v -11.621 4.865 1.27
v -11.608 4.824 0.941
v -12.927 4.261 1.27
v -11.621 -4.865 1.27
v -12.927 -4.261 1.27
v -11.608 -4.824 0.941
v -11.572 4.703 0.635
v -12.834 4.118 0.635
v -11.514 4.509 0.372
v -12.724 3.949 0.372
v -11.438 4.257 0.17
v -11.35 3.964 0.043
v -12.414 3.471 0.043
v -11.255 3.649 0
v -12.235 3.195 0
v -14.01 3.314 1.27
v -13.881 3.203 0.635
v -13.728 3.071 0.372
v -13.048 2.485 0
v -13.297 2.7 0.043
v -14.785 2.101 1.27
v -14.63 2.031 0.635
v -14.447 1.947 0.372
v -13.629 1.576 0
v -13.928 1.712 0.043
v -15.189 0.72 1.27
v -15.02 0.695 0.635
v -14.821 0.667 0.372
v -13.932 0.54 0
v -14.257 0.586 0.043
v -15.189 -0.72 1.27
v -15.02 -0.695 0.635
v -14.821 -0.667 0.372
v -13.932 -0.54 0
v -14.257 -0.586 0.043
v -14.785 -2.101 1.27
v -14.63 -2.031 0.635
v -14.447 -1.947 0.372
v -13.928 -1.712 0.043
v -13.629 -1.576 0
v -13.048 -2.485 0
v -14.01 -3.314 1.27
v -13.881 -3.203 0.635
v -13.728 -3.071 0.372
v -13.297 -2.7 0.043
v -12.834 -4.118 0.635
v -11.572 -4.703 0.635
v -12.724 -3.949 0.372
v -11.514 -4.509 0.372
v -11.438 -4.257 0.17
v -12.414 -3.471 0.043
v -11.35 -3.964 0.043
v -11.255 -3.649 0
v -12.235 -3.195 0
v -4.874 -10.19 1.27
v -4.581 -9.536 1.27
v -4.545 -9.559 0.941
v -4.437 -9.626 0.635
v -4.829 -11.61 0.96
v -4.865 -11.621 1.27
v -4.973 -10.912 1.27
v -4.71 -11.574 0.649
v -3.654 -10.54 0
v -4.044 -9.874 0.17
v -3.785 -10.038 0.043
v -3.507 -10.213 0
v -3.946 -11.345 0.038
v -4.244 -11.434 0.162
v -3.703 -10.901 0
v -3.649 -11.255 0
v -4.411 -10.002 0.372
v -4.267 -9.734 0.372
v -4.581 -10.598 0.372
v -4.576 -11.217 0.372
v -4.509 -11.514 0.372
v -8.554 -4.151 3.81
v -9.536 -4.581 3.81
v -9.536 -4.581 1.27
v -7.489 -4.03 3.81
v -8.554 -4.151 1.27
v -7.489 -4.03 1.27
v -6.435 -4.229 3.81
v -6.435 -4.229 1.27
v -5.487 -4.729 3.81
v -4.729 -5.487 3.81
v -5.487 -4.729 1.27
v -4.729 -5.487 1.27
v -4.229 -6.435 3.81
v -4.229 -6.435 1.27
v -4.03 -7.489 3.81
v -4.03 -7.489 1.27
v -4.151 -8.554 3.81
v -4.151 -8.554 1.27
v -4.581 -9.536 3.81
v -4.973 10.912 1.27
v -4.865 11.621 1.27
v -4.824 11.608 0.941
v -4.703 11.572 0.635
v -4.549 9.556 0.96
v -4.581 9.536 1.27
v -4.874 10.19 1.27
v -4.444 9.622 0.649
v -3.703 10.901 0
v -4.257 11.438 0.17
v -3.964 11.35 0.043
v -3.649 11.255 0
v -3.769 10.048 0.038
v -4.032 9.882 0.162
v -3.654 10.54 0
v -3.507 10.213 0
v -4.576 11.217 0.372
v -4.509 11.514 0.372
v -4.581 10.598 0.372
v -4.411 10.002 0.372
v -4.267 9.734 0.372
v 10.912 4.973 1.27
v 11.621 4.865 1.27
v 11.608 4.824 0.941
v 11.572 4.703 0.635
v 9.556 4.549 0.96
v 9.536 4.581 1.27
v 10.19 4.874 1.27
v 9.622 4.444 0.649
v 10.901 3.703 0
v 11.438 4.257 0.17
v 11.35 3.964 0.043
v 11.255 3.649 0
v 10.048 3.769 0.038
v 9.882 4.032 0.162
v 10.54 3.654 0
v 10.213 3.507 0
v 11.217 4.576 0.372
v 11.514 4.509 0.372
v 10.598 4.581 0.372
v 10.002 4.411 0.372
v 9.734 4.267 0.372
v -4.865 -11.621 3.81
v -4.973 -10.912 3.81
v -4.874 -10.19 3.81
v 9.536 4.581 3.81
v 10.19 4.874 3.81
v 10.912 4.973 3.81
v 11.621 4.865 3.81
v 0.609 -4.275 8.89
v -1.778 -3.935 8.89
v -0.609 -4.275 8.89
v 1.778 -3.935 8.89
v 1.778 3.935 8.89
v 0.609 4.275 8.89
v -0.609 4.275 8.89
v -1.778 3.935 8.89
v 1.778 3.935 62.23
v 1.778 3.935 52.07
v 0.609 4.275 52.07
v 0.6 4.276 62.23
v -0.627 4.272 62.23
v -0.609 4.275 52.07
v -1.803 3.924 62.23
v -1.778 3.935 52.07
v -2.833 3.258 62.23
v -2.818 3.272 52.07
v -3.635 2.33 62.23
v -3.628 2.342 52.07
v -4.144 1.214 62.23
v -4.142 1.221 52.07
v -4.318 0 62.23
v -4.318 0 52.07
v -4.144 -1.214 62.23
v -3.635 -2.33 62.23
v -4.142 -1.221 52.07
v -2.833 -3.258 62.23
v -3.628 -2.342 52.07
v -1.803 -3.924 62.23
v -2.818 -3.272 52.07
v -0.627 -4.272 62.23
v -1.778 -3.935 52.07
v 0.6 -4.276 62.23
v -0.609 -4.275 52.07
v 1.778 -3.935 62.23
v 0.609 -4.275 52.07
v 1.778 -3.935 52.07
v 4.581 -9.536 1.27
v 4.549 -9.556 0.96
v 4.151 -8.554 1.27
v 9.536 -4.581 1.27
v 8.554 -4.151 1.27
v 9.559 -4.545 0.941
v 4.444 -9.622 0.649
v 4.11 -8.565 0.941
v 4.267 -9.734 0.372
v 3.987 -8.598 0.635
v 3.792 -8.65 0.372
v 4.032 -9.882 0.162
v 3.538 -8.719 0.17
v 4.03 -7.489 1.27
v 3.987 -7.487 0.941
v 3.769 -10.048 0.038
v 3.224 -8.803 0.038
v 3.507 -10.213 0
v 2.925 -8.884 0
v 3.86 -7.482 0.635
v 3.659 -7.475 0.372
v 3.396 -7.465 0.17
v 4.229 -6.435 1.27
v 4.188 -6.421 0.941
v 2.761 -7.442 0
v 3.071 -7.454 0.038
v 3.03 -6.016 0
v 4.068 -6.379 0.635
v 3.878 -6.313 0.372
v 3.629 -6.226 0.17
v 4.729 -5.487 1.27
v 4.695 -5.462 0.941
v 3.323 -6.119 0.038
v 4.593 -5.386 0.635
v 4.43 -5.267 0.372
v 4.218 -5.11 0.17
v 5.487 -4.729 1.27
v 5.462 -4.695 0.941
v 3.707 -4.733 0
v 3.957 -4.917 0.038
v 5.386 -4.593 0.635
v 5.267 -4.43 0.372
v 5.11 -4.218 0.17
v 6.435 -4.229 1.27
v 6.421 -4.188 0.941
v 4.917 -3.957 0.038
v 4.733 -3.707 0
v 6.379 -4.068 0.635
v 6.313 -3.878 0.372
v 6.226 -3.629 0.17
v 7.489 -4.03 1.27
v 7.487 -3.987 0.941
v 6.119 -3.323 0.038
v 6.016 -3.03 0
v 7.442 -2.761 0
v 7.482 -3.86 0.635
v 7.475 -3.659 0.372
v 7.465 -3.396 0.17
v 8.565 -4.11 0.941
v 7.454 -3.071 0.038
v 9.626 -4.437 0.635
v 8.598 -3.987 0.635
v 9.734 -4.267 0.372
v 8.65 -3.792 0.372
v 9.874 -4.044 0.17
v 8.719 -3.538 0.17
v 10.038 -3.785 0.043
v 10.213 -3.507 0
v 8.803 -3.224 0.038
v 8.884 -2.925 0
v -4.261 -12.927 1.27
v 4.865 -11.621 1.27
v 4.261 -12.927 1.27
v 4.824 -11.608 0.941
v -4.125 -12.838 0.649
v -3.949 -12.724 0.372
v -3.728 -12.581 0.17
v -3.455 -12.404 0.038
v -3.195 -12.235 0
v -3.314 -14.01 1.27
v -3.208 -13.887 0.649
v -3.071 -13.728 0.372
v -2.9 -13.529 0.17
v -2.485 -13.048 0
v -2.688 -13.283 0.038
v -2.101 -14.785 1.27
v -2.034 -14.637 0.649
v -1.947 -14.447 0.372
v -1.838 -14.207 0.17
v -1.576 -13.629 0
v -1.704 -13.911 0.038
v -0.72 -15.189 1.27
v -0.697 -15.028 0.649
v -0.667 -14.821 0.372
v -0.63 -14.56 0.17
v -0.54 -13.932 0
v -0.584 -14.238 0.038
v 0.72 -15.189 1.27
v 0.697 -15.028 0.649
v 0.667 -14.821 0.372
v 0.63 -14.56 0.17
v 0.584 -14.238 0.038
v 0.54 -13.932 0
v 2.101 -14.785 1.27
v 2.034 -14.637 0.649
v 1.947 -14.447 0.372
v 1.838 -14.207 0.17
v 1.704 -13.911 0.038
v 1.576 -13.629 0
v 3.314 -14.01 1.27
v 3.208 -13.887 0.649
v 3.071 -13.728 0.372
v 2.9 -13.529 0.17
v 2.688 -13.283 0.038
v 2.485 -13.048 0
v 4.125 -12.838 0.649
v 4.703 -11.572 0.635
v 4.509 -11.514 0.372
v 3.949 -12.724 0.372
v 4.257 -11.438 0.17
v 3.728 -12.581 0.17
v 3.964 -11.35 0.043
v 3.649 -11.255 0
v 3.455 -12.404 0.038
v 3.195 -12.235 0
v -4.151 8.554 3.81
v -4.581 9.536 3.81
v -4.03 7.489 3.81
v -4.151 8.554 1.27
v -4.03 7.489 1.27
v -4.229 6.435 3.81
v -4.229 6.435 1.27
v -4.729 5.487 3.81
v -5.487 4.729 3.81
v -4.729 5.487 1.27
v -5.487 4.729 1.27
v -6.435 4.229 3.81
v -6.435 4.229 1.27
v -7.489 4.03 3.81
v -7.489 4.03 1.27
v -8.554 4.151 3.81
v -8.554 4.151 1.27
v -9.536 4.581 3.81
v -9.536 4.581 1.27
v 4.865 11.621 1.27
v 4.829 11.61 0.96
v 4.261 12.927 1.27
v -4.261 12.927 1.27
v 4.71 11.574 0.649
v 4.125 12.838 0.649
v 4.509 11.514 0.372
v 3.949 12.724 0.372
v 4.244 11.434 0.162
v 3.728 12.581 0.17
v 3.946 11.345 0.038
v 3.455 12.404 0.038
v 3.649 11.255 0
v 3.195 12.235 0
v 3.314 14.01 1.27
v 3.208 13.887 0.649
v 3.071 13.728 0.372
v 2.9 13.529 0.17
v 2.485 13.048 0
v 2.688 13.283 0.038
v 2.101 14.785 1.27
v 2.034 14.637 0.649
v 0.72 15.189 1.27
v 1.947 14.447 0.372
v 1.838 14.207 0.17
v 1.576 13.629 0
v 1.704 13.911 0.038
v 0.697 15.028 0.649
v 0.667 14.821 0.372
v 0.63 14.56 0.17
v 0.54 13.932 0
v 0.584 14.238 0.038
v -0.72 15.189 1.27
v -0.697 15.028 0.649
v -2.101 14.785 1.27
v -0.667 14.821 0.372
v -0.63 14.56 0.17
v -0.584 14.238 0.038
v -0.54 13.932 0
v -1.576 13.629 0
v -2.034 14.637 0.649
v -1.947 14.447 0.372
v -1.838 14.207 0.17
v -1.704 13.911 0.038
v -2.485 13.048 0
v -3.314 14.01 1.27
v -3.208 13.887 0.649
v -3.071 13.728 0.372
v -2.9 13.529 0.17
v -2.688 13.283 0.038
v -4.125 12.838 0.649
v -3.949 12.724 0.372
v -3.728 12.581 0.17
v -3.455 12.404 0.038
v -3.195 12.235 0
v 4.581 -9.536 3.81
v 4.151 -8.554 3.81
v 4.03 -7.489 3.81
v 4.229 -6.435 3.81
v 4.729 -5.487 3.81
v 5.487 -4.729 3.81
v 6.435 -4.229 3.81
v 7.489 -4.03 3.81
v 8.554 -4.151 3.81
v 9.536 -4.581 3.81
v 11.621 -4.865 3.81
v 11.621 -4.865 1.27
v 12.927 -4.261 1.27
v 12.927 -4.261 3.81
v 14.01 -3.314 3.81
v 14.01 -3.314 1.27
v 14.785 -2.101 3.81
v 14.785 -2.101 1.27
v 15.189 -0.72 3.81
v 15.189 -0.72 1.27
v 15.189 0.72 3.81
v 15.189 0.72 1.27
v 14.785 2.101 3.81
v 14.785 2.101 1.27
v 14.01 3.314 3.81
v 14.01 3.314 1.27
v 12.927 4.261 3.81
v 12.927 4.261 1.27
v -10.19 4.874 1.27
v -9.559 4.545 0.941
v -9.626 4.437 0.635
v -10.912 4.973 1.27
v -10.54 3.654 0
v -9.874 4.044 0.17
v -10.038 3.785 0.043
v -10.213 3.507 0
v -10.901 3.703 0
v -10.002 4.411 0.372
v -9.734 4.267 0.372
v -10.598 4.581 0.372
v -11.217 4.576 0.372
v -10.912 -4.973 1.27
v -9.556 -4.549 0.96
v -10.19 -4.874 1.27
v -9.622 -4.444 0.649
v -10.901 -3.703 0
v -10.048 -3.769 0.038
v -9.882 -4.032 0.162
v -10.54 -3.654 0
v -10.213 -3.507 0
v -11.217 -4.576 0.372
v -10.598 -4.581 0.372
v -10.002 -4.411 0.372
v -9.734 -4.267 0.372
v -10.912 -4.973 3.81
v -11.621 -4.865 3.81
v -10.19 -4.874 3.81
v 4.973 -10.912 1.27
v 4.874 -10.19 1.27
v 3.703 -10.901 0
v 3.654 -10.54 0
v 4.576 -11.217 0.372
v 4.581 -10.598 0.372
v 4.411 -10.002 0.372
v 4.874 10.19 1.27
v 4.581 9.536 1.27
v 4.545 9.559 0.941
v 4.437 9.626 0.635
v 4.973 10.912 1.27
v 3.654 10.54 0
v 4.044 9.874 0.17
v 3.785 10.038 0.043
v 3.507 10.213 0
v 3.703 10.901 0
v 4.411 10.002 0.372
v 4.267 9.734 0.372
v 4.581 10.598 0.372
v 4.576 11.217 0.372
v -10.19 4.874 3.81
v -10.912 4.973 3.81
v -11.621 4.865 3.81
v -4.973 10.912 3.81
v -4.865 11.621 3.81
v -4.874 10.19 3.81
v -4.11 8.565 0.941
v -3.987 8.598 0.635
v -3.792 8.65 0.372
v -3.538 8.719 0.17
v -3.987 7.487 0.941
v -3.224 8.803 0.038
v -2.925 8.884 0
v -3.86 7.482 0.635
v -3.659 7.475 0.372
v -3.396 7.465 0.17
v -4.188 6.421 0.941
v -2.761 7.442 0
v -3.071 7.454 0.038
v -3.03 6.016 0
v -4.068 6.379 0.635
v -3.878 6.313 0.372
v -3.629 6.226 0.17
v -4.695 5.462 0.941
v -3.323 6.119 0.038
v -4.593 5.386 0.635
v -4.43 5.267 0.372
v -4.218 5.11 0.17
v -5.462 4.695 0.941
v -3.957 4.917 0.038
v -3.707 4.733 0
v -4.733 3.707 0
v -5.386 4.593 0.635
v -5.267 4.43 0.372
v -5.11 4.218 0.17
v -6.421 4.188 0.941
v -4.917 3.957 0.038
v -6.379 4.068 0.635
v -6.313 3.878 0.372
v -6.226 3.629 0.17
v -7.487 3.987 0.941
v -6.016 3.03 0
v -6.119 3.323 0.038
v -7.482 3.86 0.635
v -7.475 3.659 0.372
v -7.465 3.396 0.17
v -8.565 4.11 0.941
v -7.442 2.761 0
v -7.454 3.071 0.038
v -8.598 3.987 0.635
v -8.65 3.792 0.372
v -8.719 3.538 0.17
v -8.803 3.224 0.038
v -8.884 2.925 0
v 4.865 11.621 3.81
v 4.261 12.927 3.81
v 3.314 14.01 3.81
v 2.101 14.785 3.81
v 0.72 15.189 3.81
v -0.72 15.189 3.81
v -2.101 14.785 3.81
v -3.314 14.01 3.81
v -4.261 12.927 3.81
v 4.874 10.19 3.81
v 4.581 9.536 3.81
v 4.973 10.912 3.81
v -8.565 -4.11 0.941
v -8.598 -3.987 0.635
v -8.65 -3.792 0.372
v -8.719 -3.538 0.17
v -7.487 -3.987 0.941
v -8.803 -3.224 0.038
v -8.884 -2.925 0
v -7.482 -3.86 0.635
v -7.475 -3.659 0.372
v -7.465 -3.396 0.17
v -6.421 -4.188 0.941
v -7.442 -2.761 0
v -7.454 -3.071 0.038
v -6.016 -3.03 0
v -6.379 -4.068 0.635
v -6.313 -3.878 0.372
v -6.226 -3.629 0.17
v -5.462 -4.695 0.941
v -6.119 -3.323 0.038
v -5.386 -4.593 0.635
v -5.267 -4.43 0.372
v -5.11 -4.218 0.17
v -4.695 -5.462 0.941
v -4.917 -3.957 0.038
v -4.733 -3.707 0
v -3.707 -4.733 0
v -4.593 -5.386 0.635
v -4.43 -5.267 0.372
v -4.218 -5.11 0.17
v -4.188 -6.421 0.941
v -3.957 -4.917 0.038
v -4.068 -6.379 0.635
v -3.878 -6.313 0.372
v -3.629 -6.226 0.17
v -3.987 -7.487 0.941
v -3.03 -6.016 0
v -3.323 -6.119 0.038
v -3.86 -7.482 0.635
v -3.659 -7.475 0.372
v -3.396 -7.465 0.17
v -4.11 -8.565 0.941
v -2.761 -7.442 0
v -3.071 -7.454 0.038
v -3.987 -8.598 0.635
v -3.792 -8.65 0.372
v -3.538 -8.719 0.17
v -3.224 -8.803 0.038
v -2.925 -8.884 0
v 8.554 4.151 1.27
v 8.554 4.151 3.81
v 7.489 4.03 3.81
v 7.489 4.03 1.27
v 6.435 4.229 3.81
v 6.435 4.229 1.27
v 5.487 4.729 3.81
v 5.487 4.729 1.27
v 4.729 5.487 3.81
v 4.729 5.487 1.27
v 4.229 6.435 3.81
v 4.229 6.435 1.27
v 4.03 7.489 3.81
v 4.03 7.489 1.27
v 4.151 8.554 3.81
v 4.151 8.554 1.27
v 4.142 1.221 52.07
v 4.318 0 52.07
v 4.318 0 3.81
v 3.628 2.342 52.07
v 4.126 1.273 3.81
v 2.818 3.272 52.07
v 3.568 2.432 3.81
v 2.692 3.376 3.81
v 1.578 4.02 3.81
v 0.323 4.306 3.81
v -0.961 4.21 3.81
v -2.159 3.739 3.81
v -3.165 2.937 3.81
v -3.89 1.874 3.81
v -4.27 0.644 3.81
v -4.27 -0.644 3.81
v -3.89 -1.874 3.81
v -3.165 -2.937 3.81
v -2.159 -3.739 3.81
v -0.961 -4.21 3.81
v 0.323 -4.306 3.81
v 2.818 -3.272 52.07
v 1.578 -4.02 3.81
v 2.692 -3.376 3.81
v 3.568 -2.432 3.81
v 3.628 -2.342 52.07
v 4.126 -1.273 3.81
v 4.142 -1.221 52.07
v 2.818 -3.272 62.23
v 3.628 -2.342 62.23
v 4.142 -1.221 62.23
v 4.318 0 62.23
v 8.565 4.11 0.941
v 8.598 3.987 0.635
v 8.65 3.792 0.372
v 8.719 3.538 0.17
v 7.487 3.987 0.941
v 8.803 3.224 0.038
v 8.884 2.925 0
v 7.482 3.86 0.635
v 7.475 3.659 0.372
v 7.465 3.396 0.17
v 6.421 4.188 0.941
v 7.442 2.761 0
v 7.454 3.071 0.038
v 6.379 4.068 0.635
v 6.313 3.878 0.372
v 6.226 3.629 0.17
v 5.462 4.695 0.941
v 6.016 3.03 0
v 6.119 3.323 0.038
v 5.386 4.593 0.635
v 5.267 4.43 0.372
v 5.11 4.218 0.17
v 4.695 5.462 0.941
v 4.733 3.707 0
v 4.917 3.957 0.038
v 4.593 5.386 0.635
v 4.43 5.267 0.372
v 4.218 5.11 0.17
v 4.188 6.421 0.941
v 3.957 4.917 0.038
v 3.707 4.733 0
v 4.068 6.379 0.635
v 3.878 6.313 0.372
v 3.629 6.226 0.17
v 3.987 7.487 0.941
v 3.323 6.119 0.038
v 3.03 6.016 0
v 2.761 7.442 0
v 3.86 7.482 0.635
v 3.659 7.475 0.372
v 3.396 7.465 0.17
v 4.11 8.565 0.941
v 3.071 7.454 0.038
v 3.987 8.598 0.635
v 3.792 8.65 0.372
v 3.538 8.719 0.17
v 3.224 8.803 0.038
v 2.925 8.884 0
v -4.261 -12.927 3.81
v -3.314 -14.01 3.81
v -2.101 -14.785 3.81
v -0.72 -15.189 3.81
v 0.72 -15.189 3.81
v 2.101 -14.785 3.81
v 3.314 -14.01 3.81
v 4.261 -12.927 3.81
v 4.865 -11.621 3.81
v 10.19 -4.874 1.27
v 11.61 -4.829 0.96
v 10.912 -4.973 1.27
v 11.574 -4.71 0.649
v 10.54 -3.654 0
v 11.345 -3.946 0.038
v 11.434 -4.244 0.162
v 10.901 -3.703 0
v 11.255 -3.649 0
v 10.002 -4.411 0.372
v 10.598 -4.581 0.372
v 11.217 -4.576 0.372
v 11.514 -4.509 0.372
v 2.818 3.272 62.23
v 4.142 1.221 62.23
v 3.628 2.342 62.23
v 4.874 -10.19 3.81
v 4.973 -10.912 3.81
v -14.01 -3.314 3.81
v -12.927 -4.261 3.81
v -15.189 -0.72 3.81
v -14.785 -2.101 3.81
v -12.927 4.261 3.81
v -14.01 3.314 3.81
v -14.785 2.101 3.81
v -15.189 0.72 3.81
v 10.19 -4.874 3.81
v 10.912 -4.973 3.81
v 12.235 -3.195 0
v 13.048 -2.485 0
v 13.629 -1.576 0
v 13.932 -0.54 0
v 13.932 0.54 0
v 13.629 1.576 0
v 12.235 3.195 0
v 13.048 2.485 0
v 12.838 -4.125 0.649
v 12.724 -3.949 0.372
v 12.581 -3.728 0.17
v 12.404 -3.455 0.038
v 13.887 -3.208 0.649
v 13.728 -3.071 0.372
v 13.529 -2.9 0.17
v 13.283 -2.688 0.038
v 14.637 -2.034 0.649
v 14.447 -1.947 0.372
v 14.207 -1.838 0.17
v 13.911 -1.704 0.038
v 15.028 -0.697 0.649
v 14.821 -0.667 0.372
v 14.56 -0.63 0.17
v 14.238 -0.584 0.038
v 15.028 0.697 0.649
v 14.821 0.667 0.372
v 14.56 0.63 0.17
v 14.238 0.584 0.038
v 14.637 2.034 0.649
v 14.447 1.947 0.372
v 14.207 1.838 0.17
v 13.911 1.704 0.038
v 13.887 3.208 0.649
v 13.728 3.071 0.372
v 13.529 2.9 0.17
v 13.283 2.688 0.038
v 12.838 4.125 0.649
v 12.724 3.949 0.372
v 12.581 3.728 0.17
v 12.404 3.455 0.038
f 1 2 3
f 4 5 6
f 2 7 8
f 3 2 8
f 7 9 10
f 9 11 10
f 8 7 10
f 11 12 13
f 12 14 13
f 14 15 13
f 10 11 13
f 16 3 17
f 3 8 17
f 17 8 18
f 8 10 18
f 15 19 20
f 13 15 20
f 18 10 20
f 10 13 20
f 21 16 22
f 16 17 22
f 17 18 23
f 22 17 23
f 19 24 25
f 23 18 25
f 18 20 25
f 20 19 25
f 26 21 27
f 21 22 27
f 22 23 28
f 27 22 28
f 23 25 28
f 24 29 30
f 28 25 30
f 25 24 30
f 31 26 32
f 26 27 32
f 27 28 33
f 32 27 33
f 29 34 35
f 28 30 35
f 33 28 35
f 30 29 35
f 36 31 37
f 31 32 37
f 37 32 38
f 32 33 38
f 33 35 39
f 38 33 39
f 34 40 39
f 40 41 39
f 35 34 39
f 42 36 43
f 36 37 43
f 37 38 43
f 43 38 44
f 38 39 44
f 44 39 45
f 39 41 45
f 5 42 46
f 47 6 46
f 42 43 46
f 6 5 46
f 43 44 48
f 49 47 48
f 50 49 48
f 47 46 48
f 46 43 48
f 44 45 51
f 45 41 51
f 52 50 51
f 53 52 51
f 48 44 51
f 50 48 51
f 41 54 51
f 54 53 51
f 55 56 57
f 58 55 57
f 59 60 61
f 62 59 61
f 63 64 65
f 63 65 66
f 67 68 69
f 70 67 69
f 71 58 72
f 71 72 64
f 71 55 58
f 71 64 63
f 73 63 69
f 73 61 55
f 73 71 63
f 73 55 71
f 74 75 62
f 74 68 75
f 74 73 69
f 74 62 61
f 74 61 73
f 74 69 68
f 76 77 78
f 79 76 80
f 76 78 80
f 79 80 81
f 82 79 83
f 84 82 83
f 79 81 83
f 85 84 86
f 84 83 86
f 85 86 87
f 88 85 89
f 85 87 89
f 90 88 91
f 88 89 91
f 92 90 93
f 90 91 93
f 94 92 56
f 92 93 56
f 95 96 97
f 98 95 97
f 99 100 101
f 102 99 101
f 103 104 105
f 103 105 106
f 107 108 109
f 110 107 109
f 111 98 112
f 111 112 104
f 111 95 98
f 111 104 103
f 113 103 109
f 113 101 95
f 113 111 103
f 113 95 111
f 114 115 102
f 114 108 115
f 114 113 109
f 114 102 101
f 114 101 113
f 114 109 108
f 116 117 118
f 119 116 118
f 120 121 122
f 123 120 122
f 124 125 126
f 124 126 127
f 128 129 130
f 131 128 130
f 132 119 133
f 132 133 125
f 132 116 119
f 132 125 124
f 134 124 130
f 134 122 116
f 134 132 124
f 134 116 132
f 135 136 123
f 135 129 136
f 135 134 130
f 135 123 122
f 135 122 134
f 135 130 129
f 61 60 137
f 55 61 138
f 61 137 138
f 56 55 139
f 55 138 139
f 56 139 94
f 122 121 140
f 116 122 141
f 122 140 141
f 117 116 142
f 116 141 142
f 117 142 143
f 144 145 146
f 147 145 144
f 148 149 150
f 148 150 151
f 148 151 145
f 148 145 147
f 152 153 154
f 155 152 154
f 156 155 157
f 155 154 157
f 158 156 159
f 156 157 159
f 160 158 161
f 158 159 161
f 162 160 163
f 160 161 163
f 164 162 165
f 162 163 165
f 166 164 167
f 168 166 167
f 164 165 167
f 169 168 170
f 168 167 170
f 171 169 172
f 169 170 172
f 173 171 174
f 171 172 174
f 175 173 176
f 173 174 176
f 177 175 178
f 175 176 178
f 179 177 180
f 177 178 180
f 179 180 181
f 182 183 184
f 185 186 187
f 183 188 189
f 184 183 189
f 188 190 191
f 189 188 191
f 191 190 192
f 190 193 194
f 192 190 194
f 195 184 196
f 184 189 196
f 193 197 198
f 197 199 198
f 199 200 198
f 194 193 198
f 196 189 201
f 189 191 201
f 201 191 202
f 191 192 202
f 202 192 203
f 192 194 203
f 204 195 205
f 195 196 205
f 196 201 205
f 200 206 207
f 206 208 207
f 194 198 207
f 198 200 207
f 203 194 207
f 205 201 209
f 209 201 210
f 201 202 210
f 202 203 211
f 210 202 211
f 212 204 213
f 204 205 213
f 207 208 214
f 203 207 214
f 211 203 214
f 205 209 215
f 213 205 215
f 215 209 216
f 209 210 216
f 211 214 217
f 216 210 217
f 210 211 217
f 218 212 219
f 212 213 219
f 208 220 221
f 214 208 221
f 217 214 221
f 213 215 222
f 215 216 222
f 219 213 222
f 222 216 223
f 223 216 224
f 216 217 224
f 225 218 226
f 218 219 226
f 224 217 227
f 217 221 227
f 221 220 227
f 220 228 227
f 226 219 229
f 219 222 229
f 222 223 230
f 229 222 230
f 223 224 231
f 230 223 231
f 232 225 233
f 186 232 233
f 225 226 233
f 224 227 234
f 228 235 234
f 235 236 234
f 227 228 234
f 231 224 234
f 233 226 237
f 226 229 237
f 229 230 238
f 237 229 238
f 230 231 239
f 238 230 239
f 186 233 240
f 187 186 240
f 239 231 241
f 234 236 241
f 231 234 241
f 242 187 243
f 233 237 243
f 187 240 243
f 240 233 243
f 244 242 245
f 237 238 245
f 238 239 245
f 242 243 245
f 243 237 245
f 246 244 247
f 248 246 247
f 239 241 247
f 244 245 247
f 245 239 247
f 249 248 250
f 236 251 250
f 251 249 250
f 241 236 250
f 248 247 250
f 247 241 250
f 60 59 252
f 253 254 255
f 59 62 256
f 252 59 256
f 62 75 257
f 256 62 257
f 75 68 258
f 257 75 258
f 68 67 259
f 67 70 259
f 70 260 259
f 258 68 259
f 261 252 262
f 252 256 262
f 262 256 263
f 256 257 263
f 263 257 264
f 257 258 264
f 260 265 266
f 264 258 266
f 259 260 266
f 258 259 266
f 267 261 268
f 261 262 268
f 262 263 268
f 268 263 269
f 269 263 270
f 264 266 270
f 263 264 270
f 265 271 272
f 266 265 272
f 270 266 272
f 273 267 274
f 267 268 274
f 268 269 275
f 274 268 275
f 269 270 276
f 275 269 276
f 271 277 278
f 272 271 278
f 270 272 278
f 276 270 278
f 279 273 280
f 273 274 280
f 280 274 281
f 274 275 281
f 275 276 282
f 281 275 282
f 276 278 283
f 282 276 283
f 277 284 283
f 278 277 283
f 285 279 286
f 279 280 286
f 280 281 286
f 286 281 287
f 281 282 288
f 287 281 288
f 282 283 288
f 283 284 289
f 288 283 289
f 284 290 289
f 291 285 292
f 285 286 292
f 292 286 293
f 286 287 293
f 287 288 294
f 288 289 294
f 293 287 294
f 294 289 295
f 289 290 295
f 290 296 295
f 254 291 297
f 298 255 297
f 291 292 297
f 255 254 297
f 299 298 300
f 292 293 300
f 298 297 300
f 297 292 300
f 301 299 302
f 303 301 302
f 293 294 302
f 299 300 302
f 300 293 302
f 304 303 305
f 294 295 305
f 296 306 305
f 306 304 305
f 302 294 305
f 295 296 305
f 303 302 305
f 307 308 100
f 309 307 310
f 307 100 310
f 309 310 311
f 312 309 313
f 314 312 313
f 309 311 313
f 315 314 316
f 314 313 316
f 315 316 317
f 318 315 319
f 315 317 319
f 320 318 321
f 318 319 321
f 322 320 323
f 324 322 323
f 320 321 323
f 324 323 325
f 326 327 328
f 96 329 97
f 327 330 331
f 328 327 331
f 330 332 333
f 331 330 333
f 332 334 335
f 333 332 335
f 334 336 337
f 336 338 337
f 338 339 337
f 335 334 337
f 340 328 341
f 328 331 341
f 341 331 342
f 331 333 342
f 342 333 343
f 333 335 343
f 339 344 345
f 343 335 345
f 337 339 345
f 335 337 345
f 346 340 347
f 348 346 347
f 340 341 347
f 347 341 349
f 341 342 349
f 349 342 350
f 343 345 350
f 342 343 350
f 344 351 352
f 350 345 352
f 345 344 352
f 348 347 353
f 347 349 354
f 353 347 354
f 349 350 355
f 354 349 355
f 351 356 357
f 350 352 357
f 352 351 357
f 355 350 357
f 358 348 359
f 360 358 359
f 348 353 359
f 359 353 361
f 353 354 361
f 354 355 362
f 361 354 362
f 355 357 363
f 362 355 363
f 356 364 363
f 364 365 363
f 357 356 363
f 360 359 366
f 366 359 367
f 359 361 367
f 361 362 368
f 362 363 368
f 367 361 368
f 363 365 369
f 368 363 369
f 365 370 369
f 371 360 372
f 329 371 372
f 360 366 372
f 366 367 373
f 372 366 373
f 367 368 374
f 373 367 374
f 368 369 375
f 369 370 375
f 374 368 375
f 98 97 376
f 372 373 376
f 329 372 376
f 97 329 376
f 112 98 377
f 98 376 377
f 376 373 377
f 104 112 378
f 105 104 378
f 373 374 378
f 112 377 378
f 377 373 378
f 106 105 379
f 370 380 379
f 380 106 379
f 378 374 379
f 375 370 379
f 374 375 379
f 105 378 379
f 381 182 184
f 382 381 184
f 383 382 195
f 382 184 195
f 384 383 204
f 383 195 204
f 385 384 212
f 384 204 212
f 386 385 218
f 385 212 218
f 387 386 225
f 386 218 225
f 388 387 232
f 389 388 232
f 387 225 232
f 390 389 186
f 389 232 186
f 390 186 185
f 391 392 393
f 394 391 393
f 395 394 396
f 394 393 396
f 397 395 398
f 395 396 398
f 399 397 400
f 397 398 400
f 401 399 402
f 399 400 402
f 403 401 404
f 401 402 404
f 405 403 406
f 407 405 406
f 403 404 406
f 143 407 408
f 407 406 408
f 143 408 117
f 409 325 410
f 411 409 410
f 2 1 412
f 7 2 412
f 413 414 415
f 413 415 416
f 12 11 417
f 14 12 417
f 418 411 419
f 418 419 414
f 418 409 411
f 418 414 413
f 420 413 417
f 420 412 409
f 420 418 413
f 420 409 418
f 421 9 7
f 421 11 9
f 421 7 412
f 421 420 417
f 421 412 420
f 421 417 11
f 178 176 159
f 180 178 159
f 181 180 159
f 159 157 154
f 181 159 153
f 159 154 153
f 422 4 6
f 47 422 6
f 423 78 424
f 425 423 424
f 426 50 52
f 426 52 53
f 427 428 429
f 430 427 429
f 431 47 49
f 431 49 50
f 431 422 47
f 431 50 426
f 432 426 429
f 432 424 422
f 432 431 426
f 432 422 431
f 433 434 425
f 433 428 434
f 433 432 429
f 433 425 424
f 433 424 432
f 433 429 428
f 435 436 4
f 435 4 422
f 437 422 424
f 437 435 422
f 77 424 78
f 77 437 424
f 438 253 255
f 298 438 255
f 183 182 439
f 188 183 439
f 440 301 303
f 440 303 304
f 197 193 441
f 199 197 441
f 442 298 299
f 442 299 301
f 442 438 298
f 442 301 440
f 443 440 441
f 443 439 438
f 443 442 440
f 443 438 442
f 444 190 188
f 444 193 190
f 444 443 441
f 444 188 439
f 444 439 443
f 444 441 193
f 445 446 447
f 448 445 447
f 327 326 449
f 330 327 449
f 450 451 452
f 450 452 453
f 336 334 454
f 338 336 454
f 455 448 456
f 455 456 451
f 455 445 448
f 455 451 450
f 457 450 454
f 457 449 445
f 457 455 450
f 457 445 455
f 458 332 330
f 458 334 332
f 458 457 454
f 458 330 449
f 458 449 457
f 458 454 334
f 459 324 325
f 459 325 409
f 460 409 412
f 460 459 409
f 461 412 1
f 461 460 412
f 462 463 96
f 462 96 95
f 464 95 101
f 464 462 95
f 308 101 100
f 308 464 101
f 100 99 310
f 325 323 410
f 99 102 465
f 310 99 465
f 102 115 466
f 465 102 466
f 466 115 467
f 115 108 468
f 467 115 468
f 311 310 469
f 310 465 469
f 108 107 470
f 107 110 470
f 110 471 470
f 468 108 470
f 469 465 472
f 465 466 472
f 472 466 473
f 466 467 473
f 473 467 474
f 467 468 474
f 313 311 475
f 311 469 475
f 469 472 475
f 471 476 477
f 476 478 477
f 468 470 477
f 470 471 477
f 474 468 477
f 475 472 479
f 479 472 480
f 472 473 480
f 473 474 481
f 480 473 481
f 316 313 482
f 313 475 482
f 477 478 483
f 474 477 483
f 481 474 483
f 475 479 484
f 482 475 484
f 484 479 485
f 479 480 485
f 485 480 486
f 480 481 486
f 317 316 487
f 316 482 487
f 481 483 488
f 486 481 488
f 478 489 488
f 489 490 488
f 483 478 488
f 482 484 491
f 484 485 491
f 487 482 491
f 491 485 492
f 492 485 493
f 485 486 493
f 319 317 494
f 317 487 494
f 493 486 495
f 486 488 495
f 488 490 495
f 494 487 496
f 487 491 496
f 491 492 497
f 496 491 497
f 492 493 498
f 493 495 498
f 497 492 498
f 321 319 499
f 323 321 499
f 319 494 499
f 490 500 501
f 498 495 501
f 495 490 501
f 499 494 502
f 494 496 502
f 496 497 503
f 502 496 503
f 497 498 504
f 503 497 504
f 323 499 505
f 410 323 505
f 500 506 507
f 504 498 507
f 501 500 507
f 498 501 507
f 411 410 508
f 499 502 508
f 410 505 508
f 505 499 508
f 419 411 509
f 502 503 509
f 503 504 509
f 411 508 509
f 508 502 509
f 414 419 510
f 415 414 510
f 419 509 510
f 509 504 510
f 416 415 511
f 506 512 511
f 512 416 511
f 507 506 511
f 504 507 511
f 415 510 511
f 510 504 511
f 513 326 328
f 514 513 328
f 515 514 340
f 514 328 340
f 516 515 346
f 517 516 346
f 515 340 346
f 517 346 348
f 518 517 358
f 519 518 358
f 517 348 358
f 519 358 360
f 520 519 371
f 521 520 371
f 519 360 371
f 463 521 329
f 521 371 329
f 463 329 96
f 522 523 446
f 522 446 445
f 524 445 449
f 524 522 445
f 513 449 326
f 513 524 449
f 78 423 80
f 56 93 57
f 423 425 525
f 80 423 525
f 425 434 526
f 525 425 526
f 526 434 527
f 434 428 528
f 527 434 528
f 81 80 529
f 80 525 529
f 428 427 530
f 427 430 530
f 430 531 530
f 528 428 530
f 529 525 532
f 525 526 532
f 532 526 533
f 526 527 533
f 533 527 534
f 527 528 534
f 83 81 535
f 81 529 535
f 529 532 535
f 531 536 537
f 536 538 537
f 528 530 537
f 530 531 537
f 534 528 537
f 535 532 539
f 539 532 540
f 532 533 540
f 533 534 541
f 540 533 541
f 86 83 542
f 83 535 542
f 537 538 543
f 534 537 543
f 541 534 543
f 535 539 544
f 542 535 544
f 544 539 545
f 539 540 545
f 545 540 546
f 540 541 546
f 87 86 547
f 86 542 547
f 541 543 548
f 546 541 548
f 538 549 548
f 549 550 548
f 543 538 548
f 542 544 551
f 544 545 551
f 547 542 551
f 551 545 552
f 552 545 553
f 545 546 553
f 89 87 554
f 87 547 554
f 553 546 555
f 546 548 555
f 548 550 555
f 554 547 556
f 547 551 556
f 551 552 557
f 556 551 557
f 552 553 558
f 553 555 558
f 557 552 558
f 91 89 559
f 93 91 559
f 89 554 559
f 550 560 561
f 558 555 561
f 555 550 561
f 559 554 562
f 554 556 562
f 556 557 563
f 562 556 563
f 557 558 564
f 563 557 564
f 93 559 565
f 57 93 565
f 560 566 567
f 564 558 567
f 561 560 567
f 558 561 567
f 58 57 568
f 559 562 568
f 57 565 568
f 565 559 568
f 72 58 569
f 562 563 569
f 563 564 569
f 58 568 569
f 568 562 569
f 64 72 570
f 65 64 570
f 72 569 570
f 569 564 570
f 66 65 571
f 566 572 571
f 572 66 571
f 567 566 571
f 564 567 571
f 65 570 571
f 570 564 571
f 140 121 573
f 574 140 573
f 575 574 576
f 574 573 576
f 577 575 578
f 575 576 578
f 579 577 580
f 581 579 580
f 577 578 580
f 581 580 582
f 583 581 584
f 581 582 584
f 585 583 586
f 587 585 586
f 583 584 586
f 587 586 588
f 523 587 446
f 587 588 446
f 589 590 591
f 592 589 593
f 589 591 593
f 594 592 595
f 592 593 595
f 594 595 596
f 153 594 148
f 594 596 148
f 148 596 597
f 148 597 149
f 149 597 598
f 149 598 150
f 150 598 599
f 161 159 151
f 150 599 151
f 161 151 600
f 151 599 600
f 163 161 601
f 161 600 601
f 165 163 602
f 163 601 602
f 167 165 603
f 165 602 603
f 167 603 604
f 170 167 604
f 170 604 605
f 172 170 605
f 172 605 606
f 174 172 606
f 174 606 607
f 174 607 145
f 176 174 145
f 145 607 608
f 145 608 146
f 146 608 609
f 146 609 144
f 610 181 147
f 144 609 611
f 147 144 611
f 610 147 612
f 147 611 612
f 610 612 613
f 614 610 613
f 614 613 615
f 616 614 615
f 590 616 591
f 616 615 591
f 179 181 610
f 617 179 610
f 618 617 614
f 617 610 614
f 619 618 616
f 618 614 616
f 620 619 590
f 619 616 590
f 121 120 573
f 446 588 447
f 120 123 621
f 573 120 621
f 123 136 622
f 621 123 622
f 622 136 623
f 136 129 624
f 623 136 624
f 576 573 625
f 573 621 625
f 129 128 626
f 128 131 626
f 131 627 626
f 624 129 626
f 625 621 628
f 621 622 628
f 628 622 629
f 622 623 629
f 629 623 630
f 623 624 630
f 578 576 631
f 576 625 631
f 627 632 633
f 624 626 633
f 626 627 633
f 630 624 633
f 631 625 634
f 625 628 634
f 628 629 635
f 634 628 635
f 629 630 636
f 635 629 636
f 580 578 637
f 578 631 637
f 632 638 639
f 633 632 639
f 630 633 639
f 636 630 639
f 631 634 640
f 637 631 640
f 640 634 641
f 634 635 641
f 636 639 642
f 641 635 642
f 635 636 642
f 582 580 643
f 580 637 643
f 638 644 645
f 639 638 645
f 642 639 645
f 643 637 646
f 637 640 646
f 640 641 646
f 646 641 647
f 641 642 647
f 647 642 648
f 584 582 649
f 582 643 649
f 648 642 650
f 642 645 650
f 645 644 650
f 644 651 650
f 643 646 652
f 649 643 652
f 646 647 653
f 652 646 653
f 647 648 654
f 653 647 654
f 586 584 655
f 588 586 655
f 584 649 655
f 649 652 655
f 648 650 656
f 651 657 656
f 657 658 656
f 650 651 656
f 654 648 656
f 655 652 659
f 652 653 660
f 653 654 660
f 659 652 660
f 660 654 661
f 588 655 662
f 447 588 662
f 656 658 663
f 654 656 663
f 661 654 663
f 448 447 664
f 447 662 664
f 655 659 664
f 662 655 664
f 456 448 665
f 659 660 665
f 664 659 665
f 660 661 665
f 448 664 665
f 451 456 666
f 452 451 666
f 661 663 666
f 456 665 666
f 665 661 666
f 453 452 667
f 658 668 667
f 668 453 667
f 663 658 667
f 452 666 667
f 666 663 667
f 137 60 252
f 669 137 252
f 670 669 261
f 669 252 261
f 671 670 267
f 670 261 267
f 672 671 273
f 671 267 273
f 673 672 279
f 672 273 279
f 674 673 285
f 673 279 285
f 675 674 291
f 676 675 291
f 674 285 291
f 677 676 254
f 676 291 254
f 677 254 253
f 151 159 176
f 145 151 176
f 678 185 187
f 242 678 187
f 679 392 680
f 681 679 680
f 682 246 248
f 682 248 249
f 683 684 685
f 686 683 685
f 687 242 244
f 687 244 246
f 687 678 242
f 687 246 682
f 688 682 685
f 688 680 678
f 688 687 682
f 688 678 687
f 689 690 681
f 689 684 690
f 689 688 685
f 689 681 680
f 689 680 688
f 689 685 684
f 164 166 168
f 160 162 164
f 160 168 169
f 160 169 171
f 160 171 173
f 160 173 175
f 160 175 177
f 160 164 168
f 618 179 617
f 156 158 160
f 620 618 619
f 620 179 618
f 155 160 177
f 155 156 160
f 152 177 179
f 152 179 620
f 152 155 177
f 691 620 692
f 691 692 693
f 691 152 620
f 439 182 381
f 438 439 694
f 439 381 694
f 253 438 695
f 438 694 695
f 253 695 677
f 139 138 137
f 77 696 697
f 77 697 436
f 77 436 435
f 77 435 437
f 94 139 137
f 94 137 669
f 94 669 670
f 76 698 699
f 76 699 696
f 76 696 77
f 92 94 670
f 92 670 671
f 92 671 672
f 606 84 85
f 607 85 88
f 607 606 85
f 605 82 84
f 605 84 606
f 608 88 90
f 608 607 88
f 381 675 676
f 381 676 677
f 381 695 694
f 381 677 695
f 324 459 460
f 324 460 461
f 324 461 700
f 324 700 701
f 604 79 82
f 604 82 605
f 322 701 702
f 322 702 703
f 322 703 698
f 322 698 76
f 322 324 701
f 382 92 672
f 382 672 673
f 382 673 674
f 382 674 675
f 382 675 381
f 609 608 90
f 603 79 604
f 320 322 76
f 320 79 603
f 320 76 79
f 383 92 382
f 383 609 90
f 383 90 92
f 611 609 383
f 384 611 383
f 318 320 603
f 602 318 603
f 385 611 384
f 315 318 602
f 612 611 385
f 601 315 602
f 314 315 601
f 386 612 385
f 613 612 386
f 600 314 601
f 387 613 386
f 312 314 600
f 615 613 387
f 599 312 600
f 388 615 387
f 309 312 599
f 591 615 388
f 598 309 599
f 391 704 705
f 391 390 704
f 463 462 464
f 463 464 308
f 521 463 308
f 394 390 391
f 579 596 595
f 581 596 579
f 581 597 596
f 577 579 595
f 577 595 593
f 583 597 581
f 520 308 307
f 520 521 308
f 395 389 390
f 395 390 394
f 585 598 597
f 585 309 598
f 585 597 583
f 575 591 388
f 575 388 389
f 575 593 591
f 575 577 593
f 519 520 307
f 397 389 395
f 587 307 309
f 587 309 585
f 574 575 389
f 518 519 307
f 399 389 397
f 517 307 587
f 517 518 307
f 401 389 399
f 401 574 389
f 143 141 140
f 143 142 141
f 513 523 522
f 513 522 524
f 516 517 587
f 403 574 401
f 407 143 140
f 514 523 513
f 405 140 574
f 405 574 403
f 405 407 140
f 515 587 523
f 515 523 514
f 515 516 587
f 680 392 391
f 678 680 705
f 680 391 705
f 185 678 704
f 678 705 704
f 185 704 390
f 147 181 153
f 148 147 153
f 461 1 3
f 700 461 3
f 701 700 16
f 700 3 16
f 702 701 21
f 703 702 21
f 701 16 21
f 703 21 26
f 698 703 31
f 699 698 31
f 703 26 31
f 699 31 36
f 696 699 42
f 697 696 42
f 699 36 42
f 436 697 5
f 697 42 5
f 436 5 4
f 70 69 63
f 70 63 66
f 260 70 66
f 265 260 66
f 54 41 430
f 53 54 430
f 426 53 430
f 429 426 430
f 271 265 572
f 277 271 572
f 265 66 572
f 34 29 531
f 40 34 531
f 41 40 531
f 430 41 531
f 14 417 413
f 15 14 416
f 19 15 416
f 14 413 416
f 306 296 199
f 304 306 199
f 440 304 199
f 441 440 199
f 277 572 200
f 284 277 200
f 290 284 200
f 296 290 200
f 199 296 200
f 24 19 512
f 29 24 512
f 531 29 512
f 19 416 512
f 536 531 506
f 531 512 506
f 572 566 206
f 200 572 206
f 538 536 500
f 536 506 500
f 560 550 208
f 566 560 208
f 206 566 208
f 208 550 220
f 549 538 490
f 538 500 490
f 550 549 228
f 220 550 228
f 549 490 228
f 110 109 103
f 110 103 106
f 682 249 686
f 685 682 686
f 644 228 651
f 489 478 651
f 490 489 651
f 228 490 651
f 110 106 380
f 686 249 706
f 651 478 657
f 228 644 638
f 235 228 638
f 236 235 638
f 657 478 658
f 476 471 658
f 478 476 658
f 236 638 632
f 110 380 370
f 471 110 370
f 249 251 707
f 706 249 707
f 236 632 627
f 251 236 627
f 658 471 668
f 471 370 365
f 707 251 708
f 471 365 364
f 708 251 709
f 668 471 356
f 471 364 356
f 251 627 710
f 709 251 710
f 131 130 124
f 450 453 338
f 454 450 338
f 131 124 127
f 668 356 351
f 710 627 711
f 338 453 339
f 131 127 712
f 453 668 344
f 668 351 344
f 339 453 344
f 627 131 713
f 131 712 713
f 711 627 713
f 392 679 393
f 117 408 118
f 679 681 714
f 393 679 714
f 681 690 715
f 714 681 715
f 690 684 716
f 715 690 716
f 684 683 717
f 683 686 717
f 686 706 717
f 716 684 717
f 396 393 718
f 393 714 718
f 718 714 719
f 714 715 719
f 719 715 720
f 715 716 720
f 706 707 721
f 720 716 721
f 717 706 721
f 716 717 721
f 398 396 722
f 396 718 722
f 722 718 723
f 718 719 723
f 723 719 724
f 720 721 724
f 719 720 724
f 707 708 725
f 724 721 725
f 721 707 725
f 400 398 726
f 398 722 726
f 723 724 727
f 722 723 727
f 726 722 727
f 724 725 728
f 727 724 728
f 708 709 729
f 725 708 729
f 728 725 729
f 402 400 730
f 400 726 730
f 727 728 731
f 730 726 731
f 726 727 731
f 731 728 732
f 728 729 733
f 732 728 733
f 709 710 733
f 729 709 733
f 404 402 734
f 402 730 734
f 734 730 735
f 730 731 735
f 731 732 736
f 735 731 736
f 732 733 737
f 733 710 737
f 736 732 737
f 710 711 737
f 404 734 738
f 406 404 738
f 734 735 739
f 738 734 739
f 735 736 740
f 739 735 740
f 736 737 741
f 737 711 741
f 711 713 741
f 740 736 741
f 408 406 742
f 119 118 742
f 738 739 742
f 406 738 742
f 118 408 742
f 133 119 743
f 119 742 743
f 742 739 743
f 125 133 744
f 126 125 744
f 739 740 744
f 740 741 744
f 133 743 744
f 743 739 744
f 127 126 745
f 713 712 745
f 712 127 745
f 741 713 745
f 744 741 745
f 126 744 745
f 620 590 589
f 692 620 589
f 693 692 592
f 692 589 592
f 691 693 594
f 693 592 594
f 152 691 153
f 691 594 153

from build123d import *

# Parameters (mm, degrees)
F0_R     = 4.318
F1_DEPTH = 3.81
F2_DEPTH = 52.07
F4_DEPTH = 43.18
F6_DEPTH = 10.16
F7_R     = 2.54
F8_R     = 1.27


with BuildPart() as f1:
    # F0 (on Top) → F1 (new body)
    with BuildSketch(Plane.XY):
        with BuildLine():
            ThreePointArc((10.16, 5.08), (5.08, 5.08), (5.08, 10.16))
            ThreePointArc((5.08, 10.16), (0, 15.24), (-5.08, 10.16))
            ThreePointArc((-5.08, 10.16), (-5.08, 5.08), (-10.16, 5.08))
            ThreePointArc((-10.16, 5.08), (-15.24, 0), (-10.16, -5.08))
            ThreePointArc((-10.16, -5.08), (-5.08, -5.08), (-5.08, -10.16))
            ThreePointArc((-5.08, -10.16), (0, -15.24), (5.08, -10.16))
            ThreePointArc((5.08, -10.16), (5.08, -5.08), (10.16, -5.08))
            ThreePointArc((10.16, -5.08), (15.24, 0), (10.16, 5.08))
        make_face()
        Circle(F0_R, mode=Mode.SUBTRACT)
    extrude(amount=F1_DEPTH)

    # F0 (on Top) → F2 (join)
    with BuildSketch(Plane.XY):
        Circle(F0_R)
    extrude(amount=F2_DEPTH)

    # F3 (on face) → F4 (cut)
    with BuildSketch(Plane.XY.offset(52.07)):
        with BuildLine():
            Line((1.778, -3.9349510797), (1.778, 3.9349510797))
            ThreePointArc((1.778, 3.9349510797), (0, 4.318), (-1.778, 3.9349510797))
            Line((-1.778, 3.9349510797), (-1.778, -3.9349510797))
            ThreePointArc((-1.778, -3.9349510797), (0, -4.318), (1.778, -3.9349510797))
        make_face()
    extrude(amount=-F4_DEPTH, mode=Mode.SUBTRACT)

    # F5 (on face) → F6 (join)
    with BuildSketch(Plane.XY.offset(52.07)):
        with BuildLine():
            Line((1.778, -3.9349510797), (1.778, 3.9349510797))
            ThreePointArc((1.778, 3.9349510797), (-4.318, 0), (1.778, -3.9349510797))
        make_face()
        with BuildLine():
            ThreePointArc((1.778, -3.9349510797), (3.6278456417, -2.3417642922), (4.318, 0))
            ThreePointArc((4.318, 0), (3.6278456417, 2.3417642922), (1.778, 3.9349510797))
            Line((1.778, 3.9349510797), (1.778, -3.9349510797))
        make_face()
    extrude(amount=F6_DEPTH)

    # F7
    f7_edges = [f1.edges().sort_by_distance(p)[0] for p in [
        (-5.08, -10.16, 1.905),
        (-10.16, -5.08, 1.905),
        (5.08, -10.16, 1.905),
        (10.16, -5.08, 1.905),
        (10.16, 5.08, 1.905),
        (5.08, 10.16, 1.905),
        (-10.16, 5.08, 1.905),
        (-5.08, 10.16, 1.905),
    ]]
    fillet(f7_edges, radius=F7_R)

    # F8
    f8_edges = [f1.edges().sort_by_distance(p)[0] for p in [
        (-15.24, 0, 0),
        (-5.08, -5.08, 0),
        (0, -15.24, 0),
        (-10.547376, -4.949482, 0),
        (5.08, -5.08, 0),
        (4.949482, -10.547376, 0),
        (10.547376, -4.949482, 0),
        (15.24, 0, 0),
        (10.547376, 4.949482, 0),
        (5.08, 5.08, 0),
        (4.949482, 10.547376, 0),
        (0, 15.24, 0),
        (-4.949482, 10.547376, 0),
        (-5.08, 5.08, 0),
        (-10.547376, 4.949482, 0),
        (-4.949482, -10.547376, 0),
    ]]
    fillet(f8_edges, radius=F8_R)


solid = f1.part
